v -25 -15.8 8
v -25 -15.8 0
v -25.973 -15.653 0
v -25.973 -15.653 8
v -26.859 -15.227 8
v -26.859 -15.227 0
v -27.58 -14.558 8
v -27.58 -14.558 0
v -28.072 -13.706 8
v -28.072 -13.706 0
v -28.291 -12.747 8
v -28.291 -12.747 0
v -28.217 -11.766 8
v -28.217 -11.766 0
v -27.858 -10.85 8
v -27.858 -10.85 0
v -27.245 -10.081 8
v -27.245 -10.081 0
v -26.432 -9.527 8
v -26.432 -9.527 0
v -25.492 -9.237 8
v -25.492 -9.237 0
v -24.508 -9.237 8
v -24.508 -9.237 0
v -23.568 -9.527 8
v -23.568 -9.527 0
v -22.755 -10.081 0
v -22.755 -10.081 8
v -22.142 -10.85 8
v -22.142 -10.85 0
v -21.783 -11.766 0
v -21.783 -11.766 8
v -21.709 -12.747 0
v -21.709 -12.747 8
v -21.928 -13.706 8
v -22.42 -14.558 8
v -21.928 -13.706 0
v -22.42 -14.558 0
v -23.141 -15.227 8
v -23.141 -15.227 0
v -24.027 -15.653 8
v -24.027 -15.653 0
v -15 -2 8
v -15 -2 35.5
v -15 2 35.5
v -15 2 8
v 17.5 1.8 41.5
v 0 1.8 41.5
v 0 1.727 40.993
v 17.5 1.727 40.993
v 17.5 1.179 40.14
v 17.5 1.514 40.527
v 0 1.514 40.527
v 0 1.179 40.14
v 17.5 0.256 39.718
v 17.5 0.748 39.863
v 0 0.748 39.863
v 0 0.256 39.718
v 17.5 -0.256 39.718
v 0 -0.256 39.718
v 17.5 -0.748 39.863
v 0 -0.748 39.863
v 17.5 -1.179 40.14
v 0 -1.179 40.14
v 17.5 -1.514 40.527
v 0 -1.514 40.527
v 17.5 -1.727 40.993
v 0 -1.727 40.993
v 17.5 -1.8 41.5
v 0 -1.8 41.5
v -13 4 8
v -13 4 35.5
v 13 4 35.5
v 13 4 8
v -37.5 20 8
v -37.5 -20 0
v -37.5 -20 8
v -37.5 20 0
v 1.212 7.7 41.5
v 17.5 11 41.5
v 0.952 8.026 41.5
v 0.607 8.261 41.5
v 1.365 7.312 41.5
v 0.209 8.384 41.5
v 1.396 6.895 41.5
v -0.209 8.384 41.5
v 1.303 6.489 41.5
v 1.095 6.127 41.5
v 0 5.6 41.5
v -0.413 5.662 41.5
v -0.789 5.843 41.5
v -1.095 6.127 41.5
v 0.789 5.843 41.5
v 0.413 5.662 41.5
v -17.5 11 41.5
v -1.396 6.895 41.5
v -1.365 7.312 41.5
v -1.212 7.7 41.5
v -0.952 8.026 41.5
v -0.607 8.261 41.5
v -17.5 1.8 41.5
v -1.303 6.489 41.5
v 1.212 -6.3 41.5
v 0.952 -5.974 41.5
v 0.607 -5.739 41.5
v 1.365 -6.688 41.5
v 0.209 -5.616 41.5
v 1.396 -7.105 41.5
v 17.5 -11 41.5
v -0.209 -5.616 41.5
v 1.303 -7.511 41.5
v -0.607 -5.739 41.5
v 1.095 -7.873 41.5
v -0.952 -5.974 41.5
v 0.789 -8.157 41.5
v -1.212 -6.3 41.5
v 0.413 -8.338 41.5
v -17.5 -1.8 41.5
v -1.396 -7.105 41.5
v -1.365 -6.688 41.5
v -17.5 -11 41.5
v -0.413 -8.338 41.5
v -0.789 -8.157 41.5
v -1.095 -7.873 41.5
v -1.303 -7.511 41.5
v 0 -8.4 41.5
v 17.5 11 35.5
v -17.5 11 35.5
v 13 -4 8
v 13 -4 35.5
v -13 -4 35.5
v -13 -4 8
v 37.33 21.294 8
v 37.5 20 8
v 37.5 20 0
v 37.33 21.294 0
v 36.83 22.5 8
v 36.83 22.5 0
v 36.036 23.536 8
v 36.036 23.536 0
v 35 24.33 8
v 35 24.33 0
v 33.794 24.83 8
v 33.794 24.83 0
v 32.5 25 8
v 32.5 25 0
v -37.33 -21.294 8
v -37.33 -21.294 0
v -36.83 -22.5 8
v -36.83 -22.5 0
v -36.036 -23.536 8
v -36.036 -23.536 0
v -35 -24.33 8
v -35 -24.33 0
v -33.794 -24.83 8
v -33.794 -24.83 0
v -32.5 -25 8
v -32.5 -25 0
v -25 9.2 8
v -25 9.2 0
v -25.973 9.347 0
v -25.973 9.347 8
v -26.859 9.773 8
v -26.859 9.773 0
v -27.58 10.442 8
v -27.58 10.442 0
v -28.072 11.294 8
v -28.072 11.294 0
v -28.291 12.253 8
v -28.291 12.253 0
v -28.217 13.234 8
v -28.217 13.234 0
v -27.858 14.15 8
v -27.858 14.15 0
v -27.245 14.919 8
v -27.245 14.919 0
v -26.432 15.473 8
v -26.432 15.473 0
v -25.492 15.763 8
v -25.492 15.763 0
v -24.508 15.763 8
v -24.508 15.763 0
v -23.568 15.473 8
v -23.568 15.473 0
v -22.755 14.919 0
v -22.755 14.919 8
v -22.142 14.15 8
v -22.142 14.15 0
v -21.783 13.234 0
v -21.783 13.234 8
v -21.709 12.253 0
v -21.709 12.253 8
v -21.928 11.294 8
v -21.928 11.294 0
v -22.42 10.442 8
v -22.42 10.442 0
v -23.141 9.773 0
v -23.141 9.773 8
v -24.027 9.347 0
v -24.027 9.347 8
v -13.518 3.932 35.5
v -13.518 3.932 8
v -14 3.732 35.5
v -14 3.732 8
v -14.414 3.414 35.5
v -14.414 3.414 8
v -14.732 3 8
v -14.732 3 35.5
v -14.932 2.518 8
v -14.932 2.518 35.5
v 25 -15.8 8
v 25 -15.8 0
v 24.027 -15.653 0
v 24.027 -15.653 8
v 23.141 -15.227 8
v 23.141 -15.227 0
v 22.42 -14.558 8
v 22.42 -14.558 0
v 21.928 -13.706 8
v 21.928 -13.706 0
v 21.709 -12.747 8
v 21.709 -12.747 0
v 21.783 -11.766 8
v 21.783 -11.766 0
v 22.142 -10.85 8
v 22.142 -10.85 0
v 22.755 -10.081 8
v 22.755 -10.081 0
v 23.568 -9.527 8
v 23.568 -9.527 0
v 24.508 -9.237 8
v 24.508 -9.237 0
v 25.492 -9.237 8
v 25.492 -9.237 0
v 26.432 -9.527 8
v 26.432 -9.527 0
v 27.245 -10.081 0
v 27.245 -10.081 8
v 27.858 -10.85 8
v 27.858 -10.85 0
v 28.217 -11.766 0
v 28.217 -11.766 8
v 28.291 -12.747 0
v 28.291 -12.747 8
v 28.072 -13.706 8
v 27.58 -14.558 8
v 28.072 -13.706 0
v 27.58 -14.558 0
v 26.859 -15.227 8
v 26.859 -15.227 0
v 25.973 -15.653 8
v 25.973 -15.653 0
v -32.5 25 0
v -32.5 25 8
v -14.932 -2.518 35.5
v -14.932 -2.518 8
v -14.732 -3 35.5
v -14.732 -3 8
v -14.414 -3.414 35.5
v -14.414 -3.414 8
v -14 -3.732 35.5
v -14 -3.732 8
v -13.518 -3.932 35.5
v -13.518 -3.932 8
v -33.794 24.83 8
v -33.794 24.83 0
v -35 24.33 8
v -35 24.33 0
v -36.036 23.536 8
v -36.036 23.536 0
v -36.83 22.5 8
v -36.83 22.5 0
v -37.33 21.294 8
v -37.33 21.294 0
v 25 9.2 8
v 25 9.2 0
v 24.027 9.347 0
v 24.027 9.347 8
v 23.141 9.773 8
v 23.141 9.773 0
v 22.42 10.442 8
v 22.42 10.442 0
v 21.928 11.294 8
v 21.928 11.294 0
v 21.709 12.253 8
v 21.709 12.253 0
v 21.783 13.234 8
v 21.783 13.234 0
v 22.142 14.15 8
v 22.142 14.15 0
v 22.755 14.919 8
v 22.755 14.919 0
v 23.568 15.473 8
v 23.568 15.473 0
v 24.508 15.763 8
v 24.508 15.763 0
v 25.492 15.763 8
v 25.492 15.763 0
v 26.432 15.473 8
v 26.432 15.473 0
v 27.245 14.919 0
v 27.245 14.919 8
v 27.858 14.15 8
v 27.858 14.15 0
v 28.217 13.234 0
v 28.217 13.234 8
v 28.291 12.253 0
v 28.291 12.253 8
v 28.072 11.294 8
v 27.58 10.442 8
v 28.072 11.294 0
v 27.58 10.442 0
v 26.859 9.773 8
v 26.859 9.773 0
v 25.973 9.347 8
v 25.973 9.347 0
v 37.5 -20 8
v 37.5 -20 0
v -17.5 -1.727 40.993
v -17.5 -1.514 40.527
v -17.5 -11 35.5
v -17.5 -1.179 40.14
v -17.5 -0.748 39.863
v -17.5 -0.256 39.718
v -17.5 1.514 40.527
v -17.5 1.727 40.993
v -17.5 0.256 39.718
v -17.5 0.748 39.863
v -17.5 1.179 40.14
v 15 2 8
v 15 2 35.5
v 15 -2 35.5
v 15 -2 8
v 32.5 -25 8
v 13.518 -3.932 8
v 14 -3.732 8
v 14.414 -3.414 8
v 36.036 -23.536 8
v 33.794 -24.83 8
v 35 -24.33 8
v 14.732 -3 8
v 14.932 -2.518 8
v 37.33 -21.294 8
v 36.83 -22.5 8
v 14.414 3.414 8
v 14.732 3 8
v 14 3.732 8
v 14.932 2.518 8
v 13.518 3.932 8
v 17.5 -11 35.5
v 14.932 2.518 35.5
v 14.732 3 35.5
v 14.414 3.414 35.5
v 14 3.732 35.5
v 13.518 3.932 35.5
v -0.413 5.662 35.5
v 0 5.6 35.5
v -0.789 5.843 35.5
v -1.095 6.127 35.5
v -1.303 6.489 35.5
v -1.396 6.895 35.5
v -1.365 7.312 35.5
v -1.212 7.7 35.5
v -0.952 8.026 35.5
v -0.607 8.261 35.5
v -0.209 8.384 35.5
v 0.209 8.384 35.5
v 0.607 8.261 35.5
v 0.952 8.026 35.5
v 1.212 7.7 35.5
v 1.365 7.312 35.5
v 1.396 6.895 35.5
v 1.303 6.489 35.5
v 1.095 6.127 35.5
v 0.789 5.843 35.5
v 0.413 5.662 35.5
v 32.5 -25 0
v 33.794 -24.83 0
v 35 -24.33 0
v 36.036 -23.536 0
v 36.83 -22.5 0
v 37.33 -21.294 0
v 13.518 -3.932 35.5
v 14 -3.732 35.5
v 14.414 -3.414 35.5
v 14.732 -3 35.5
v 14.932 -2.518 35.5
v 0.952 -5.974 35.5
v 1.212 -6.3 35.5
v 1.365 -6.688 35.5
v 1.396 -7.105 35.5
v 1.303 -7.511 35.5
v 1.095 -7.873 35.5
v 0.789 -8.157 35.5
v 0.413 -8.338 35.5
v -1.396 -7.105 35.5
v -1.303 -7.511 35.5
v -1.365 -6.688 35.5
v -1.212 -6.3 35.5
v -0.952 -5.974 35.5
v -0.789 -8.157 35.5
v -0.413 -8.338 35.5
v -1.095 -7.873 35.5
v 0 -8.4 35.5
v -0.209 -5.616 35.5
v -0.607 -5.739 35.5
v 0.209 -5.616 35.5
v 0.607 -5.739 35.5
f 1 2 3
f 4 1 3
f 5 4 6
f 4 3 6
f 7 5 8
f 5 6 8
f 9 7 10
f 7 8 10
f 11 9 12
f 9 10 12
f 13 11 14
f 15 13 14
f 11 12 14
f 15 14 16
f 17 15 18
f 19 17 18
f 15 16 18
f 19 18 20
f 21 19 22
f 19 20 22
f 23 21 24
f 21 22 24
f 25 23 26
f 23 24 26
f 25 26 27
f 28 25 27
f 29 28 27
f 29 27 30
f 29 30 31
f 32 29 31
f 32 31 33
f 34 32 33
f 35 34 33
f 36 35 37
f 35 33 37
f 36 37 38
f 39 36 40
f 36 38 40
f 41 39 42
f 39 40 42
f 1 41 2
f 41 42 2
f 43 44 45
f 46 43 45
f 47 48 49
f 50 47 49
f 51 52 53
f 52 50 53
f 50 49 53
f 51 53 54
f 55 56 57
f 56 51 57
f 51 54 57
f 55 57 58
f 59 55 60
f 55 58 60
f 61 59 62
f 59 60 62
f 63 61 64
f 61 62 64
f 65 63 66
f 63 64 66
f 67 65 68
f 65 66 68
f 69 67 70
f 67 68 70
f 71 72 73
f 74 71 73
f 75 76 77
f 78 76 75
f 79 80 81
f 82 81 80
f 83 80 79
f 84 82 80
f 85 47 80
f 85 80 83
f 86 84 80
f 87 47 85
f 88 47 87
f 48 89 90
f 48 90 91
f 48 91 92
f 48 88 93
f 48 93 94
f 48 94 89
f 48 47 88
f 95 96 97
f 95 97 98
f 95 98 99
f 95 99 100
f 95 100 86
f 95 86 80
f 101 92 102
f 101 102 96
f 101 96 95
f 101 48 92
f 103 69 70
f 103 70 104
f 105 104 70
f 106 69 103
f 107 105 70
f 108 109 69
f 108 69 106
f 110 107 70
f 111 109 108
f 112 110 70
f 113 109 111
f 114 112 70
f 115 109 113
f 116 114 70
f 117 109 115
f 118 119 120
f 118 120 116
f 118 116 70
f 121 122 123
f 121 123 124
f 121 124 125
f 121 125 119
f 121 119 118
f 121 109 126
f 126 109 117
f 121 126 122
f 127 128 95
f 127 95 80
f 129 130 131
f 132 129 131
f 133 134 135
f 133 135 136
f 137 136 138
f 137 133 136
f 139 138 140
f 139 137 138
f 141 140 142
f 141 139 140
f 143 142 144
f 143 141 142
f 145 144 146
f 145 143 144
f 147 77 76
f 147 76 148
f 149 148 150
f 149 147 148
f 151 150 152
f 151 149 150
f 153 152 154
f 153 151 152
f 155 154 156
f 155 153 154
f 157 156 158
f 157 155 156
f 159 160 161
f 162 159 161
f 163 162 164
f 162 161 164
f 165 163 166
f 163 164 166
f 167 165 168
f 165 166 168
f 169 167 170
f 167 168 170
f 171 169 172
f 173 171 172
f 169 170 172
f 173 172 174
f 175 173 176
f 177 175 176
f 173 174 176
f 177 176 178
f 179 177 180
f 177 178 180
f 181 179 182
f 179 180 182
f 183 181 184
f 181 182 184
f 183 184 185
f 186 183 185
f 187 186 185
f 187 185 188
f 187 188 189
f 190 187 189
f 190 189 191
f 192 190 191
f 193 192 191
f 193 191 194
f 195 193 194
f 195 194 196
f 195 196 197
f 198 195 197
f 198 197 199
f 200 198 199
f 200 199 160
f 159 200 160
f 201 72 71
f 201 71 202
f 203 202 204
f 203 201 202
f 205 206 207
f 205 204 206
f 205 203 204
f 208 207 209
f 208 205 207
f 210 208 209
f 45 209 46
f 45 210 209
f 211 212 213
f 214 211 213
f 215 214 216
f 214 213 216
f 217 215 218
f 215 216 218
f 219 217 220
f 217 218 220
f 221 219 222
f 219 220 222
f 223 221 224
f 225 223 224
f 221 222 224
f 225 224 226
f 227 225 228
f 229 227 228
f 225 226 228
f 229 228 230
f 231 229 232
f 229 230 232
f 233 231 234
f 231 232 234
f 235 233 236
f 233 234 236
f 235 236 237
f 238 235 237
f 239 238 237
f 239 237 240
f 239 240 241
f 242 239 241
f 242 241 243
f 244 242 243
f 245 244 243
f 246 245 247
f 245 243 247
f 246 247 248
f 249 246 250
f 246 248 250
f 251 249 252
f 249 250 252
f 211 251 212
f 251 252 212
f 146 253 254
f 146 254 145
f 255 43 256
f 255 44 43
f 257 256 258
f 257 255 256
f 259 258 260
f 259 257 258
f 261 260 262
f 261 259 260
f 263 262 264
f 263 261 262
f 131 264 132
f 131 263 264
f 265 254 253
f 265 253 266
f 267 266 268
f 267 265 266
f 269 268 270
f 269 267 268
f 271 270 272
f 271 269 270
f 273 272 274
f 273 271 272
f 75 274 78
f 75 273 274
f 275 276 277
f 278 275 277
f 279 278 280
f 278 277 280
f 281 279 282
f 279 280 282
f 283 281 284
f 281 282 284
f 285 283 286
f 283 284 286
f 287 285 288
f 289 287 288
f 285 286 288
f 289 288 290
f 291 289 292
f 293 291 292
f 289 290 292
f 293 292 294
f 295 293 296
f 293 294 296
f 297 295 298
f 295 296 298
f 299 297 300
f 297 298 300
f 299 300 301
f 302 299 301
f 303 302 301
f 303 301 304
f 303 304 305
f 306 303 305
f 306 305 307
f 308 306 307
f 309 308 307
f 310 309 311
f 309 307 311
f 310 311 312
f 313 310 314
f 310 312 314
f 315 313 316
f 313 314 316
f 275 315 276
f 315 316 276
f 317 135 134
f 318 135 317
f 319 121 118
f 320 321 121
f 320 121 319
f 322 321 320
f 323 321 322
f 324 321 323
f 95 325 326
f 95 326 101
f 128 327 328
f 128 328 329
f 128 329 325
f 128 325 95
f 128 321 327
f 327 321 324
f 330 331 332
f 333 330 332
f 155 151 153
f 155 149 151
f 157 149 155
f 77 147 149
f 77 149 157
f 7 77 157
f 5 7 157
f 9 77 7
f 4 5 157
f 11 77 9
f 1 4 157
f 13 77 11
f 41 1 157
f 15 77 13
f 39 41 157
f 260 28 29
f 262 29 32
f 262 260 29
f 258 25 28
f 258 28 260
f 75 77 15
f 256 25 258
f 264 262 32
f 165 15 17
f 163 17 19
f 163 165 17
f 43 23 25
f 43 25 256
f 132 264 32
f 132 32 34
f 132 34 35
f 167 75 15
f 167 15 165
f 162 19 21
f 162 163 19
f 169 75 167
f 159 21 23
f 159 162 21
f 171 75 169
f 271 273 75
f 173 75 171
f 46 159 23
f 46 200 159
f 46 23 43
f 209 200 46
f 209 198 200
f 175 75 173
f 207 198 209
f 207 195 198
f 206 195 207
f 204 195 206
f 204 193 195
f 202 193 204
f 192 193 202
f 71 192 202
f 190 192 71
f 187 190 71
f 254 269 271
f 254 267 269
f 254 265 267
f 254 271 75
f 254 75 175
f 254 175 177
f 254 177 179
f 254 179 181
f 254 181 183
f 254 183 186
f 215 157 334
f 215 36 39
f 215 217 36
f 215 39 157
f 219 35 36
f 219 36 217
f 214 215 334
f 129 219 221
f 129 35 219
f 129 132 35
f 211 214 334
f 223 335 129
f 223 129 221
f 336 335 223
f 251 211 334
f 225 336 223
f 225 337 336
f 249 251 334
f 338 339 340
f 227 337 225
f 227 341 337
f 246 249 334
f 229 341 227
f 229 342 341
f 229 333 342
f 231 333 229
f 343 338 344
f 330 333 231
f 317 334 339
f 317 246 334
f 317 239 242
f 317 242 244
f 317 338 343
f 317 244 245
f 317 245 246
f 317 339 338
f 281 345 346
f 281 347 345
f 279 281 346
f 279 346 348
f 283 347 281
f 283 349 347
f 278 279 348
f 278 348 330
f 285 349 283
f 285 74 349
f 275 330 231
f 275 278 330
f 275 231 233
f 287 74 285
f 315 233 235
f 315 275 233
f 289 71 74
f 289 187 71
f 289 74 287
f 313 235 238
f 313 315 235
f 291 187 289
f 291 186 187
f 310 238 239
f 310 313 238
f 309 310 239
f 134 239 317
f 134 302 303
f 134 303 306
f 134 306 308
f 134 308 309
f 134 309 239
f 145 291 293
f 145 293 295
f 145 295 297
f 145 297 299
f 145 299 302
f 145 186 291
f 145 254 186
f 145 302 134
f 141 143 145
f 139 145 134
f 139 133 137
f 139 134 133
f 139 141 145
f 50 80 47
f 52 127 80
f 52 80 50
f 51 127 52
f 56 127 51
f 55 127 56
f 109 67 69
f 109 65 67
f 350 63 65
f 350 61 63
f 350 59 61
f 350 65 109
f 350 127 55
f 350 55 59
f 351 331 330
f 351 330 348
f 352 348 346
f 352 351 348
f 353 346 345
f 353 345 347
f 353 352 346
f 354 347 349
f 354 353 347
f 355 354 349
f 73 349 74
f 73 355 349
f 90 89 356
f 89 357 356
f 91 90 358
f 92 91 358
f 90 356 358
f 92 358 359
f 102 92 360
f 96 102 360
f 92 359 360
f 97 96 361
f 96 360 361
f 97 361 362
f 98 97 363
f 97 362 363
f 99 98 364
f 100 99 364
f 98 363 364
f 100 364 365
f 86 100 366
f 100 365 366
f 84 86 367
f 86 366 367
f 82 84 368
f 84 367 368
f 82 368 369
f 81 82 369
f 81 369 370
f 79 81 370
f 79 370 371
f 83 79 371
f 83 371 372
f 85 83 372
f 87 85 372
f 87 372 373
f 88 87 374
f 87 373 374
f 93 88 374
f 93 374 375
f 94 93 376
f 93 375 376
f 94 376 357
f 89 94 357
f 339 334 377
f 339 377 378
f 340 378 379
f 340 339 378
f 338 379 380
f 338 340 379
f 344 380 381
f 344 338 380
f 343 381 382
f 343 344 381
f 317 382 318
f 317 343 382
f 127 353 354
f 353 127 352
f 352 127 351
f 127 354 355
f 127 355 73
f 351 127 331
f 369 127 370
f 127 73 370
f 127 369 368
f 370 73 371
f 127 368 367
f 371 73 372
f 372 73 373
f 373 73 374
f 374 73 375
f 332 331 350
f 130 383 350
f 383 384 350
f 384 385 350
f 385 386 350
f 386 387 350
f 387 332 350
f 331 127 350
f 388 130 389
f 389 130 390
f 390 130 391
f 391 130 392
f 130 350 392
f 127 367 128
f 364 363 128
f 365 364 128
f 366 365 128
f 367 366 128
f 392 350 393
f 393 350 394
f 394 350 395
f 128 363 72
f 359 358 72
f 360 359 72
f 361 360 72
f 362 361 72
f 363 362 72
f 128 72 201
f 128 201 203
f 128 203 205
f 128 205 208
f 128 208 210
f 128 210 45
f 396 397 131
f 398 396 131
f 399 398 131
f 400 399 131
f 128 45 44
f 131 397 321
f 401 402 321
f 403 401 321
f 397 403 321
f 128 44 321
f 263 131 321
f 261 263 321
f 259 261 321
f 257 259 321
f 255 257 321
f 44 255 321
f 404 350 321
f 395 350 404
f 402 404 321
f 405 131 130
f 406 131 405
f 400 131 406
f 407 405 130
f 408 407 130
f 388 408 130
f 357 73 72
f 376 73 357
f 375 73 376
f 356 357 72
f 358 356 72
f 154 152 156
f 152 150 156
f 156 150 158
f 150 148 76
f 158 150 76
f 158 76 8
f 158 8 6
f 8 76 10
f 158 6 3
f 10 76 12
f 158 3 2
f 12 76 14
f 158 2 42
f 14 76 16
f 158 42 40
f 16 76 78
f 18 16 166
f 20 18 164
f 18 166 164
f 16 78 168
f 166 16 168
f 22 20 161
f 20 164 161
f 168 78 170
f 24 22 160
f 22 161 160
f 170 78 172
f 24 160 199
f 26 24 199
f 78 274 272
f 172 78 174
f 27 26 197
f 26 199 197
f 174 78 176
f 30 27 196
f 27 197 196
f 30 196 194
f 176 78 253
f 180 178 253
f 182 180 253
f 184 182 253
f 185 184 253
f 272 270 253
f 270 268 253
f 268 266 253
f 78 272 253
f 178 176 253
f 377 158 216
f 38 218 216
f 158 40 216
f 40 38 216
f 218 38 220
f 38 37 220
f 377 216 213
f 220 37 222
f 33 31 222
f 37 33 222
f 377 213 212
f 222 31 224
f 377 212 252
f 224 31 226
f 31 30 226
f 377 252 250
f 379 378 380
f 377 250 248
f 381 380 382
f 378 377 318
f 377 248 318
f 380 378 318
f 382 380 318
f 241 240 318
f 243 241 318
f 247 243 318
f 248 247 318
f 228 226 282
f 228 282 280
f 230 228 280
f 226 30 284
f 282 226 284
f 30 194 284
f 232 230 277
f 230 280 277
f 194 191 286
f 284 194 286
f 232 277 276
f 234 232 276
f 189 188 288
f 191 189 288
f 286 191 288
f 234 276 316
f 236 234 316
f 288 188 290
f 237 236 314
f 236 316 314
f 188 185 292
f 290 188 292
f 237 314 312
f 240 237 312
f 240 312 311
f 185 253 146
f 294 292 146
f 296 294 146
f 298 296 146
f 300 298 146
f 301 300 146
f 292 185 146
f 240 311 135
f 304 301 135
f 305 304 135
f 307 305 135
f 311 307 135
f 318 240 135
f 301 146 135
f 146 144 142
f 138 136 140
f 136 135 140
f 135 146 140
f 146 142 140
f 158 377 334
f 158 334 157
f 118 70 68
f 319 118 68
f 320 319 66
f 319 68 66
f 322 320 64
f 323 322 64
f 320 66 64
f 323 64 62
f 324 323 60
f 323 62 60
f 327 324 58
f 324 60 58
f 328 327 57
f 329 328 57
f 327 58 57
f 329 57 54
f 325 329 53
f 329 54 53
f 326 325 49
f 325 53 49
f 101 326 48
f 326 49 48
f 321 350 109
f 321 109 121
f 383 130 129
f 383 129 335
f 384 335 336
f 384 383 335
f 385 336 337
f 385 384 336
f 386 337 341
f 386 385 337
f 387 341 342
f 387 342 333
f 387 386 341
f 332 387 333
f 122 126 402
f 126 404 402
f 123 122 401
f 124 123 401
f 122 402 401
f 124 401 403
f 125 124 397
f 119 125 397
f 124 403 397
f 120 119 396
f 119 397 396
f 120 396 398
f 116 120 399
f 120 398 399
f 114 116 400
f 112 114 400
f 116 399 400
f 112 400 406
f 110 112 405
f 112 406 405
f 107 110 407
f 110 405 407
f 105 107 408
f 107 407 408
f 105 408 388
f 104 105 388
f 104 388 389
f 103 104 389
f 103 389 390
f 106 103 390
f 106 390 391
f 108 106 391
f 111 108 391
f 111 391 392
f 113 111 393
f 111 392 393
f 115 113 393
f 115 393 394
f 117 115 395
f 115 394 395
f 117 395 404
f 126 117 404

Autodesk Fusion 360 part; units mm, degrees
sketch "草图1" plane through (0, 0, 0) normal (0, 0, 1) x (1, 0, 0)
  line L0 (37.5, -25) -> (-37.5, -25)
  line L1 (-37.5, -25) -> (-37.5, 25)
  line L2 (-37.5, 25) -> (37.5, 25)
  line L3 (37.5, 25) -> (37.5, -25)
  line L4 (37.5, -25) -> (-37.5, 25) construction
  line L5 (-37.5, -25) -> (37.5, 25) construction
  dimension "d34" = 75
  dimension "d35" = 50
extrude "拉伸1" add sketch "草图1" along normal blind 8
fillet "圆角1" radius 5 4 edges at (37.5, -25, 4) (-37.5, -25, 4) (37.5, 25, 4) (-37.5, 25, 4)
sketch "草图2" plane through (0, 0, 8) normal (0, 0, 1) x (-1, 0, 0)
  arc A0 (32.5, -25) -> (37.5, -20) centre (32.5, -20) ccw
  line L0 (37.5, -20) -> (37.5, 20)
  arc A1 (37.5, 20) -> (32.5, 25) centre (32.5, 20) ccw
  line L1 (32.5, 25) -> (-32.5, 25)
  arc A2 (-32.5, 25) -> (-37.5, 20) centre (-32.5, 20) ccw
  line L2 (-37.5, 20) -> (-37.5, -20)
  arc A3 (-37.5, -20) -> (-32.5, -25) centre (-32.5, -20) ccw
  line L3 (-32.5, -25) -> (32.5, -25)
  point P0 (-25, -12.5)
  dimension "d40" = 12.5
  dimension "d41" = 12.5
hole "孔1" at (25, 12.5, 8) direction (0, 0, -1) diameter 6.6 depth 25 tip angle 180
pattern_linear "R-阵列1" count 2 spacing 50 along (-1, 0, 0) count 2 spacing 25 along (0, -1, 0) of "孔1"
sketch "草图3" plane through (0, 0, 8) normal (0, 0, 1) x (-1, 0, 0)
  circle A0 centre (25, 12.5) radius 3.3
  circle A1 centre (-25, 12.5) radius 3.3
  circle A2 centre (25, -12.5) radius 3.3
  circle A3 centre (-25, -12.5) radius 3.3
  arc A4 (32.5, -25) -> (37.5, -20) centre (32.5, -20) ccw
  line L0 (37.5, -20) -> (37.5, 20)
  arc A5 (37.5, 20) -> (32.5, 25) centre (32.5, 20) ccw
  line L1 (32.5, 25) -> (-32.5, 25)
  arc A6 (-32.5, 25) -> (-37.5, 20) centre (-32.5, 20) ccw
  line L2 (-37.5, 20) -> (-37.5, -20)
  arc A7 (-37.5, -20) -> (-32.5, -25) centre (-32.5, -20) ccw
  line L3 (-32.5, -25) -> (32.5, -25)
  line L4 (15, -4) -> (-15, -4)
  line L5 (-15, -4) -> (-15, 4)
  line L6 (-15, 4) -> (15, 4)
  line L7 (15, 4) -> (15, -4)
  line L8 (15, -4) -> (-15, 4) construction
  line L9 (-15, -4) -> (15, 4) construction
  dimension "d49" = 30
  dimension "d50" = 8
extrude "拉伸2" add sketch "草图3" along normal blind 27.5 contours L4 L5 L6 L7
sketch "草图4" plane through (0, 0, 35.5) normal (0, 0, 1) x (-1, 0, 0)
  line L0 (15, 4) -> (-15, 4)
  line L1 (-15, 4) -> (-15, -4)
  line L2 (-15, -4) -> (15, -4)
  line L3 (15, -4) -> (15, 4)
  line L4 (17.5, -11) -> (-17.5, -11)
  line L5 (-17.5, -11) -> (-17.5, 11)
  line L6 (-17.5, 11) -> (17.5, 11)
  line L7 (17.5, 11) -> (17.5, -11)
  line L8 (17.5, -11) -> (-17.5, 11) construction
  line L9 (-17.5, -11) -> (17.5, 11) construction
  dimension "d53" = 35
  dimension "d54" = 22
extrude "拉伸3" add sketch "草图4" along normal blind 6 contours L0 L1 L2 L3 | L4 L5 L6 L7
sketch "草图5" plane through (0, 0, 0) normal (1, 0, 0) x (0, 1, 0)
  line L0 (11, 41.5) -> (-11, 41.5)
  line L1 (11, 35.5) -> (11, 41.5)
  line L2 (-11, 35.5) -> (-11, 41.5)
  circle A0 centre (0, 41.5) radius 1.8
  dimension "d57" = 3.6
extrude "拉伸4" cut sketch "草图5" along normal blind 17.5 and the other way blind 17.5
sketch "草图6" plane through (0, 0, 41.5) normal (0, 0, 1) x (-1, 0, 0)
  line L0 (17.5, -1.8) -> (-17.5, -1.8)
  line L1 (-17.5, -1.8) -> (-17.5, -11)
  line L2 (-17.5, -11) -> (17.5, -11)
  line L3 (17.5, -11) -> (17.5, -1.8)
  point P0 (0, 7)
  point P1 (0, -7)
hole "孔2" at (0, -7, 41.5) at (0, 7, 41.5) direction (0, 0, -1) diameter 2.8 depth 10 tip angle 118
fillet "圆角2" radius 2 4 edges at (15, 4, 21.75) (-15, 4, 21.75) (15, -4, 21.75) (-15, -4, 21.75)
component "Fixed_Catheter_Clamp_Base" placed x (1, 0, 0) y (0, 1, 0) z (0, 0, 1) at (0, 0, 0)
equation "Rail_Support_Height = 8 mm" comment "【占位值】导入后必须改成实测值：实验台上表面到 MGN12 导轨底面的实际垂直距离；0 mm 不是设计值。"
equation "MGN12H_Combined_Height = 13 mm" comment "MGN12 导轨底面到 MGN12H 滑块顶面的组合高度"
equation "Pulley_Base_Thickness = 6 mm" comment "MGN12H 转接底座厚度"
equation "Wheel_Base_Clearance = 1.5 mm" comment "大导向轮底面与转接底座顶面的目标间隙"
equation "Pulley_Groove_Center_Height = 8 mm" comment "大导向轮底面到导管槽中心线的高度"
equation "Clamp_Center_Height = Rail_Support_Height + MGN12H_Combined_Height + Pulley_Base_Thickness + Wheel_Base_Clearance + Pulley_Groove_Center_Height" comment "固定夹导管中心距实验台面的高度；随 Rail_Support_Height 自动更新"
equation "Clamp_Base_Length = 75 mm" comment "桌面安装底板 X 方向长度"
equation "Clamp_Base_Width = 50 mm" comment "桌面安装底板 Y 方向宽度"
equation "Clamp_Base_Thickness = 8 mm" comment "桌面安装底板厚度"
equation "Clamp_Base_Corner_Radius = 5 mm" comment "底板四角圆角半径"
equation "Table_Hole_Pitch_X = 50 mm" comment "四个 M6 桌面安装孔 X 方向中心距"
equation "Table_Hole_Pitch_Y = 25 mm" comment "四个 M6 桌面安装孔 Y 方向中心距"
equation "M6_Clearance_Diameter = 6.6 mm" comment "M6 螺钉通孔直径"
equation "Column_Length = 30 mm" comment "中央立柱 X 方向长度"
equation "Column_Width = 20 mm" comment "中央立柱 Y 方向宽度"
equation "Lower_Jaw_Length = 35 mm" comment "下夹座 X 方向长度"
equation "Lower_Jaw_Width = 22 mm" comment "下夹座 Y 方向宽度"
equation "Lower_Jaw_Height = 6 mm" comment "下夹座高度"
equation "Column_Height = Clamp_Center_Height - Clamp_Base_Thickness - Lower_Jaw_Height" comment "中央立柱从底板顶面向上的高度；随 Rail_Support_Height 自动更新"
equation "Upper_Jaw_Length = 35 mm" comment "上夹盖 X 方向长度"
equation "Upper_Jaw_Width = 22 mm" comment "上夹盖 Y 方向宽度"
equation "Upper_Jaw_Height = 5 mm" comment "上夹盖高度"
equation "Catheter_Diameter = 2.4 mm" comment "弹簧导管外径"
equation "Ecoflex_Pad_Nominal_Thickness = 0.5 mm" comment "未来 Ecoflex 软垫名义厚度；本阶段只预留接口"
equation "Catheter_Assembly_Clearance = 0.2 mm" comment "导管与未来 Ecoflex 衬垫装配预留量"
equation "Clamp_Groove_Diameter = Catheter_Diameter + 2 * Ecoflex_Pad_Nominal_Thickness + Catheter_Assembly_Clearance" comment "硬质上下夹块导管槽直径；为未来 Ecoflex 衬垫预留"
equation "Clamp_M3_Offset_Y = 7 mm" comment "两枚 M3 螺钉相对夹块中心的 Y 向偏置"
equation "M3_Cap_Clearance_Diameter = 3.4 mm" comment "上夹盖 M3 通孔直径"
equation "M3_Lower_Pilot_Diameter = 2.8 mm" comment "下夹座 M3 导向孔直径"
equation "M3_Lower_Pilot_Depth = 5 mm" comment "下夹座 M3 导向孔深度"
equation "Column_Base_Fillet = 4 mm" comment "中央立柱与底板连接处圆角半径"
equation "Jaw_Column_Fillet = 2 mm" comment "下夹座与立柱连接处可选圆角半径"
equation "Edge_Fillet = 1 mm" comment "外部尖锐边缘小圆角半径"
equation "d34 = Clamp_Base_Length"
equation "d35 = Clamp_Base_Width"
equation "d36 = Clamp_Base_Thickness"
equation "d39 = Clamp_Base_Corner_Radius"
equation "d43 = M6_Clearance_Diameter"
equation "d49 = Column_Length"
equation "d50 = Column_Width / 2 - 2 mm"
equation "d51 = Column_Height + 5 mm"
equation "d53 = Lower_Jaw_Length"
equation "d54 = Lower_Jaw_Width"
equation "d55 = Lower_Jaw_Height"
equation "d57 = Clamp_Groove_Diameter"
equation "d62 = M3_Lower_Pilot_Depth + 5 mm"
equation "d63 = M3_Lower_Pilot_Diameter"
equation "d66 = Jaw_Column_Fillet"
